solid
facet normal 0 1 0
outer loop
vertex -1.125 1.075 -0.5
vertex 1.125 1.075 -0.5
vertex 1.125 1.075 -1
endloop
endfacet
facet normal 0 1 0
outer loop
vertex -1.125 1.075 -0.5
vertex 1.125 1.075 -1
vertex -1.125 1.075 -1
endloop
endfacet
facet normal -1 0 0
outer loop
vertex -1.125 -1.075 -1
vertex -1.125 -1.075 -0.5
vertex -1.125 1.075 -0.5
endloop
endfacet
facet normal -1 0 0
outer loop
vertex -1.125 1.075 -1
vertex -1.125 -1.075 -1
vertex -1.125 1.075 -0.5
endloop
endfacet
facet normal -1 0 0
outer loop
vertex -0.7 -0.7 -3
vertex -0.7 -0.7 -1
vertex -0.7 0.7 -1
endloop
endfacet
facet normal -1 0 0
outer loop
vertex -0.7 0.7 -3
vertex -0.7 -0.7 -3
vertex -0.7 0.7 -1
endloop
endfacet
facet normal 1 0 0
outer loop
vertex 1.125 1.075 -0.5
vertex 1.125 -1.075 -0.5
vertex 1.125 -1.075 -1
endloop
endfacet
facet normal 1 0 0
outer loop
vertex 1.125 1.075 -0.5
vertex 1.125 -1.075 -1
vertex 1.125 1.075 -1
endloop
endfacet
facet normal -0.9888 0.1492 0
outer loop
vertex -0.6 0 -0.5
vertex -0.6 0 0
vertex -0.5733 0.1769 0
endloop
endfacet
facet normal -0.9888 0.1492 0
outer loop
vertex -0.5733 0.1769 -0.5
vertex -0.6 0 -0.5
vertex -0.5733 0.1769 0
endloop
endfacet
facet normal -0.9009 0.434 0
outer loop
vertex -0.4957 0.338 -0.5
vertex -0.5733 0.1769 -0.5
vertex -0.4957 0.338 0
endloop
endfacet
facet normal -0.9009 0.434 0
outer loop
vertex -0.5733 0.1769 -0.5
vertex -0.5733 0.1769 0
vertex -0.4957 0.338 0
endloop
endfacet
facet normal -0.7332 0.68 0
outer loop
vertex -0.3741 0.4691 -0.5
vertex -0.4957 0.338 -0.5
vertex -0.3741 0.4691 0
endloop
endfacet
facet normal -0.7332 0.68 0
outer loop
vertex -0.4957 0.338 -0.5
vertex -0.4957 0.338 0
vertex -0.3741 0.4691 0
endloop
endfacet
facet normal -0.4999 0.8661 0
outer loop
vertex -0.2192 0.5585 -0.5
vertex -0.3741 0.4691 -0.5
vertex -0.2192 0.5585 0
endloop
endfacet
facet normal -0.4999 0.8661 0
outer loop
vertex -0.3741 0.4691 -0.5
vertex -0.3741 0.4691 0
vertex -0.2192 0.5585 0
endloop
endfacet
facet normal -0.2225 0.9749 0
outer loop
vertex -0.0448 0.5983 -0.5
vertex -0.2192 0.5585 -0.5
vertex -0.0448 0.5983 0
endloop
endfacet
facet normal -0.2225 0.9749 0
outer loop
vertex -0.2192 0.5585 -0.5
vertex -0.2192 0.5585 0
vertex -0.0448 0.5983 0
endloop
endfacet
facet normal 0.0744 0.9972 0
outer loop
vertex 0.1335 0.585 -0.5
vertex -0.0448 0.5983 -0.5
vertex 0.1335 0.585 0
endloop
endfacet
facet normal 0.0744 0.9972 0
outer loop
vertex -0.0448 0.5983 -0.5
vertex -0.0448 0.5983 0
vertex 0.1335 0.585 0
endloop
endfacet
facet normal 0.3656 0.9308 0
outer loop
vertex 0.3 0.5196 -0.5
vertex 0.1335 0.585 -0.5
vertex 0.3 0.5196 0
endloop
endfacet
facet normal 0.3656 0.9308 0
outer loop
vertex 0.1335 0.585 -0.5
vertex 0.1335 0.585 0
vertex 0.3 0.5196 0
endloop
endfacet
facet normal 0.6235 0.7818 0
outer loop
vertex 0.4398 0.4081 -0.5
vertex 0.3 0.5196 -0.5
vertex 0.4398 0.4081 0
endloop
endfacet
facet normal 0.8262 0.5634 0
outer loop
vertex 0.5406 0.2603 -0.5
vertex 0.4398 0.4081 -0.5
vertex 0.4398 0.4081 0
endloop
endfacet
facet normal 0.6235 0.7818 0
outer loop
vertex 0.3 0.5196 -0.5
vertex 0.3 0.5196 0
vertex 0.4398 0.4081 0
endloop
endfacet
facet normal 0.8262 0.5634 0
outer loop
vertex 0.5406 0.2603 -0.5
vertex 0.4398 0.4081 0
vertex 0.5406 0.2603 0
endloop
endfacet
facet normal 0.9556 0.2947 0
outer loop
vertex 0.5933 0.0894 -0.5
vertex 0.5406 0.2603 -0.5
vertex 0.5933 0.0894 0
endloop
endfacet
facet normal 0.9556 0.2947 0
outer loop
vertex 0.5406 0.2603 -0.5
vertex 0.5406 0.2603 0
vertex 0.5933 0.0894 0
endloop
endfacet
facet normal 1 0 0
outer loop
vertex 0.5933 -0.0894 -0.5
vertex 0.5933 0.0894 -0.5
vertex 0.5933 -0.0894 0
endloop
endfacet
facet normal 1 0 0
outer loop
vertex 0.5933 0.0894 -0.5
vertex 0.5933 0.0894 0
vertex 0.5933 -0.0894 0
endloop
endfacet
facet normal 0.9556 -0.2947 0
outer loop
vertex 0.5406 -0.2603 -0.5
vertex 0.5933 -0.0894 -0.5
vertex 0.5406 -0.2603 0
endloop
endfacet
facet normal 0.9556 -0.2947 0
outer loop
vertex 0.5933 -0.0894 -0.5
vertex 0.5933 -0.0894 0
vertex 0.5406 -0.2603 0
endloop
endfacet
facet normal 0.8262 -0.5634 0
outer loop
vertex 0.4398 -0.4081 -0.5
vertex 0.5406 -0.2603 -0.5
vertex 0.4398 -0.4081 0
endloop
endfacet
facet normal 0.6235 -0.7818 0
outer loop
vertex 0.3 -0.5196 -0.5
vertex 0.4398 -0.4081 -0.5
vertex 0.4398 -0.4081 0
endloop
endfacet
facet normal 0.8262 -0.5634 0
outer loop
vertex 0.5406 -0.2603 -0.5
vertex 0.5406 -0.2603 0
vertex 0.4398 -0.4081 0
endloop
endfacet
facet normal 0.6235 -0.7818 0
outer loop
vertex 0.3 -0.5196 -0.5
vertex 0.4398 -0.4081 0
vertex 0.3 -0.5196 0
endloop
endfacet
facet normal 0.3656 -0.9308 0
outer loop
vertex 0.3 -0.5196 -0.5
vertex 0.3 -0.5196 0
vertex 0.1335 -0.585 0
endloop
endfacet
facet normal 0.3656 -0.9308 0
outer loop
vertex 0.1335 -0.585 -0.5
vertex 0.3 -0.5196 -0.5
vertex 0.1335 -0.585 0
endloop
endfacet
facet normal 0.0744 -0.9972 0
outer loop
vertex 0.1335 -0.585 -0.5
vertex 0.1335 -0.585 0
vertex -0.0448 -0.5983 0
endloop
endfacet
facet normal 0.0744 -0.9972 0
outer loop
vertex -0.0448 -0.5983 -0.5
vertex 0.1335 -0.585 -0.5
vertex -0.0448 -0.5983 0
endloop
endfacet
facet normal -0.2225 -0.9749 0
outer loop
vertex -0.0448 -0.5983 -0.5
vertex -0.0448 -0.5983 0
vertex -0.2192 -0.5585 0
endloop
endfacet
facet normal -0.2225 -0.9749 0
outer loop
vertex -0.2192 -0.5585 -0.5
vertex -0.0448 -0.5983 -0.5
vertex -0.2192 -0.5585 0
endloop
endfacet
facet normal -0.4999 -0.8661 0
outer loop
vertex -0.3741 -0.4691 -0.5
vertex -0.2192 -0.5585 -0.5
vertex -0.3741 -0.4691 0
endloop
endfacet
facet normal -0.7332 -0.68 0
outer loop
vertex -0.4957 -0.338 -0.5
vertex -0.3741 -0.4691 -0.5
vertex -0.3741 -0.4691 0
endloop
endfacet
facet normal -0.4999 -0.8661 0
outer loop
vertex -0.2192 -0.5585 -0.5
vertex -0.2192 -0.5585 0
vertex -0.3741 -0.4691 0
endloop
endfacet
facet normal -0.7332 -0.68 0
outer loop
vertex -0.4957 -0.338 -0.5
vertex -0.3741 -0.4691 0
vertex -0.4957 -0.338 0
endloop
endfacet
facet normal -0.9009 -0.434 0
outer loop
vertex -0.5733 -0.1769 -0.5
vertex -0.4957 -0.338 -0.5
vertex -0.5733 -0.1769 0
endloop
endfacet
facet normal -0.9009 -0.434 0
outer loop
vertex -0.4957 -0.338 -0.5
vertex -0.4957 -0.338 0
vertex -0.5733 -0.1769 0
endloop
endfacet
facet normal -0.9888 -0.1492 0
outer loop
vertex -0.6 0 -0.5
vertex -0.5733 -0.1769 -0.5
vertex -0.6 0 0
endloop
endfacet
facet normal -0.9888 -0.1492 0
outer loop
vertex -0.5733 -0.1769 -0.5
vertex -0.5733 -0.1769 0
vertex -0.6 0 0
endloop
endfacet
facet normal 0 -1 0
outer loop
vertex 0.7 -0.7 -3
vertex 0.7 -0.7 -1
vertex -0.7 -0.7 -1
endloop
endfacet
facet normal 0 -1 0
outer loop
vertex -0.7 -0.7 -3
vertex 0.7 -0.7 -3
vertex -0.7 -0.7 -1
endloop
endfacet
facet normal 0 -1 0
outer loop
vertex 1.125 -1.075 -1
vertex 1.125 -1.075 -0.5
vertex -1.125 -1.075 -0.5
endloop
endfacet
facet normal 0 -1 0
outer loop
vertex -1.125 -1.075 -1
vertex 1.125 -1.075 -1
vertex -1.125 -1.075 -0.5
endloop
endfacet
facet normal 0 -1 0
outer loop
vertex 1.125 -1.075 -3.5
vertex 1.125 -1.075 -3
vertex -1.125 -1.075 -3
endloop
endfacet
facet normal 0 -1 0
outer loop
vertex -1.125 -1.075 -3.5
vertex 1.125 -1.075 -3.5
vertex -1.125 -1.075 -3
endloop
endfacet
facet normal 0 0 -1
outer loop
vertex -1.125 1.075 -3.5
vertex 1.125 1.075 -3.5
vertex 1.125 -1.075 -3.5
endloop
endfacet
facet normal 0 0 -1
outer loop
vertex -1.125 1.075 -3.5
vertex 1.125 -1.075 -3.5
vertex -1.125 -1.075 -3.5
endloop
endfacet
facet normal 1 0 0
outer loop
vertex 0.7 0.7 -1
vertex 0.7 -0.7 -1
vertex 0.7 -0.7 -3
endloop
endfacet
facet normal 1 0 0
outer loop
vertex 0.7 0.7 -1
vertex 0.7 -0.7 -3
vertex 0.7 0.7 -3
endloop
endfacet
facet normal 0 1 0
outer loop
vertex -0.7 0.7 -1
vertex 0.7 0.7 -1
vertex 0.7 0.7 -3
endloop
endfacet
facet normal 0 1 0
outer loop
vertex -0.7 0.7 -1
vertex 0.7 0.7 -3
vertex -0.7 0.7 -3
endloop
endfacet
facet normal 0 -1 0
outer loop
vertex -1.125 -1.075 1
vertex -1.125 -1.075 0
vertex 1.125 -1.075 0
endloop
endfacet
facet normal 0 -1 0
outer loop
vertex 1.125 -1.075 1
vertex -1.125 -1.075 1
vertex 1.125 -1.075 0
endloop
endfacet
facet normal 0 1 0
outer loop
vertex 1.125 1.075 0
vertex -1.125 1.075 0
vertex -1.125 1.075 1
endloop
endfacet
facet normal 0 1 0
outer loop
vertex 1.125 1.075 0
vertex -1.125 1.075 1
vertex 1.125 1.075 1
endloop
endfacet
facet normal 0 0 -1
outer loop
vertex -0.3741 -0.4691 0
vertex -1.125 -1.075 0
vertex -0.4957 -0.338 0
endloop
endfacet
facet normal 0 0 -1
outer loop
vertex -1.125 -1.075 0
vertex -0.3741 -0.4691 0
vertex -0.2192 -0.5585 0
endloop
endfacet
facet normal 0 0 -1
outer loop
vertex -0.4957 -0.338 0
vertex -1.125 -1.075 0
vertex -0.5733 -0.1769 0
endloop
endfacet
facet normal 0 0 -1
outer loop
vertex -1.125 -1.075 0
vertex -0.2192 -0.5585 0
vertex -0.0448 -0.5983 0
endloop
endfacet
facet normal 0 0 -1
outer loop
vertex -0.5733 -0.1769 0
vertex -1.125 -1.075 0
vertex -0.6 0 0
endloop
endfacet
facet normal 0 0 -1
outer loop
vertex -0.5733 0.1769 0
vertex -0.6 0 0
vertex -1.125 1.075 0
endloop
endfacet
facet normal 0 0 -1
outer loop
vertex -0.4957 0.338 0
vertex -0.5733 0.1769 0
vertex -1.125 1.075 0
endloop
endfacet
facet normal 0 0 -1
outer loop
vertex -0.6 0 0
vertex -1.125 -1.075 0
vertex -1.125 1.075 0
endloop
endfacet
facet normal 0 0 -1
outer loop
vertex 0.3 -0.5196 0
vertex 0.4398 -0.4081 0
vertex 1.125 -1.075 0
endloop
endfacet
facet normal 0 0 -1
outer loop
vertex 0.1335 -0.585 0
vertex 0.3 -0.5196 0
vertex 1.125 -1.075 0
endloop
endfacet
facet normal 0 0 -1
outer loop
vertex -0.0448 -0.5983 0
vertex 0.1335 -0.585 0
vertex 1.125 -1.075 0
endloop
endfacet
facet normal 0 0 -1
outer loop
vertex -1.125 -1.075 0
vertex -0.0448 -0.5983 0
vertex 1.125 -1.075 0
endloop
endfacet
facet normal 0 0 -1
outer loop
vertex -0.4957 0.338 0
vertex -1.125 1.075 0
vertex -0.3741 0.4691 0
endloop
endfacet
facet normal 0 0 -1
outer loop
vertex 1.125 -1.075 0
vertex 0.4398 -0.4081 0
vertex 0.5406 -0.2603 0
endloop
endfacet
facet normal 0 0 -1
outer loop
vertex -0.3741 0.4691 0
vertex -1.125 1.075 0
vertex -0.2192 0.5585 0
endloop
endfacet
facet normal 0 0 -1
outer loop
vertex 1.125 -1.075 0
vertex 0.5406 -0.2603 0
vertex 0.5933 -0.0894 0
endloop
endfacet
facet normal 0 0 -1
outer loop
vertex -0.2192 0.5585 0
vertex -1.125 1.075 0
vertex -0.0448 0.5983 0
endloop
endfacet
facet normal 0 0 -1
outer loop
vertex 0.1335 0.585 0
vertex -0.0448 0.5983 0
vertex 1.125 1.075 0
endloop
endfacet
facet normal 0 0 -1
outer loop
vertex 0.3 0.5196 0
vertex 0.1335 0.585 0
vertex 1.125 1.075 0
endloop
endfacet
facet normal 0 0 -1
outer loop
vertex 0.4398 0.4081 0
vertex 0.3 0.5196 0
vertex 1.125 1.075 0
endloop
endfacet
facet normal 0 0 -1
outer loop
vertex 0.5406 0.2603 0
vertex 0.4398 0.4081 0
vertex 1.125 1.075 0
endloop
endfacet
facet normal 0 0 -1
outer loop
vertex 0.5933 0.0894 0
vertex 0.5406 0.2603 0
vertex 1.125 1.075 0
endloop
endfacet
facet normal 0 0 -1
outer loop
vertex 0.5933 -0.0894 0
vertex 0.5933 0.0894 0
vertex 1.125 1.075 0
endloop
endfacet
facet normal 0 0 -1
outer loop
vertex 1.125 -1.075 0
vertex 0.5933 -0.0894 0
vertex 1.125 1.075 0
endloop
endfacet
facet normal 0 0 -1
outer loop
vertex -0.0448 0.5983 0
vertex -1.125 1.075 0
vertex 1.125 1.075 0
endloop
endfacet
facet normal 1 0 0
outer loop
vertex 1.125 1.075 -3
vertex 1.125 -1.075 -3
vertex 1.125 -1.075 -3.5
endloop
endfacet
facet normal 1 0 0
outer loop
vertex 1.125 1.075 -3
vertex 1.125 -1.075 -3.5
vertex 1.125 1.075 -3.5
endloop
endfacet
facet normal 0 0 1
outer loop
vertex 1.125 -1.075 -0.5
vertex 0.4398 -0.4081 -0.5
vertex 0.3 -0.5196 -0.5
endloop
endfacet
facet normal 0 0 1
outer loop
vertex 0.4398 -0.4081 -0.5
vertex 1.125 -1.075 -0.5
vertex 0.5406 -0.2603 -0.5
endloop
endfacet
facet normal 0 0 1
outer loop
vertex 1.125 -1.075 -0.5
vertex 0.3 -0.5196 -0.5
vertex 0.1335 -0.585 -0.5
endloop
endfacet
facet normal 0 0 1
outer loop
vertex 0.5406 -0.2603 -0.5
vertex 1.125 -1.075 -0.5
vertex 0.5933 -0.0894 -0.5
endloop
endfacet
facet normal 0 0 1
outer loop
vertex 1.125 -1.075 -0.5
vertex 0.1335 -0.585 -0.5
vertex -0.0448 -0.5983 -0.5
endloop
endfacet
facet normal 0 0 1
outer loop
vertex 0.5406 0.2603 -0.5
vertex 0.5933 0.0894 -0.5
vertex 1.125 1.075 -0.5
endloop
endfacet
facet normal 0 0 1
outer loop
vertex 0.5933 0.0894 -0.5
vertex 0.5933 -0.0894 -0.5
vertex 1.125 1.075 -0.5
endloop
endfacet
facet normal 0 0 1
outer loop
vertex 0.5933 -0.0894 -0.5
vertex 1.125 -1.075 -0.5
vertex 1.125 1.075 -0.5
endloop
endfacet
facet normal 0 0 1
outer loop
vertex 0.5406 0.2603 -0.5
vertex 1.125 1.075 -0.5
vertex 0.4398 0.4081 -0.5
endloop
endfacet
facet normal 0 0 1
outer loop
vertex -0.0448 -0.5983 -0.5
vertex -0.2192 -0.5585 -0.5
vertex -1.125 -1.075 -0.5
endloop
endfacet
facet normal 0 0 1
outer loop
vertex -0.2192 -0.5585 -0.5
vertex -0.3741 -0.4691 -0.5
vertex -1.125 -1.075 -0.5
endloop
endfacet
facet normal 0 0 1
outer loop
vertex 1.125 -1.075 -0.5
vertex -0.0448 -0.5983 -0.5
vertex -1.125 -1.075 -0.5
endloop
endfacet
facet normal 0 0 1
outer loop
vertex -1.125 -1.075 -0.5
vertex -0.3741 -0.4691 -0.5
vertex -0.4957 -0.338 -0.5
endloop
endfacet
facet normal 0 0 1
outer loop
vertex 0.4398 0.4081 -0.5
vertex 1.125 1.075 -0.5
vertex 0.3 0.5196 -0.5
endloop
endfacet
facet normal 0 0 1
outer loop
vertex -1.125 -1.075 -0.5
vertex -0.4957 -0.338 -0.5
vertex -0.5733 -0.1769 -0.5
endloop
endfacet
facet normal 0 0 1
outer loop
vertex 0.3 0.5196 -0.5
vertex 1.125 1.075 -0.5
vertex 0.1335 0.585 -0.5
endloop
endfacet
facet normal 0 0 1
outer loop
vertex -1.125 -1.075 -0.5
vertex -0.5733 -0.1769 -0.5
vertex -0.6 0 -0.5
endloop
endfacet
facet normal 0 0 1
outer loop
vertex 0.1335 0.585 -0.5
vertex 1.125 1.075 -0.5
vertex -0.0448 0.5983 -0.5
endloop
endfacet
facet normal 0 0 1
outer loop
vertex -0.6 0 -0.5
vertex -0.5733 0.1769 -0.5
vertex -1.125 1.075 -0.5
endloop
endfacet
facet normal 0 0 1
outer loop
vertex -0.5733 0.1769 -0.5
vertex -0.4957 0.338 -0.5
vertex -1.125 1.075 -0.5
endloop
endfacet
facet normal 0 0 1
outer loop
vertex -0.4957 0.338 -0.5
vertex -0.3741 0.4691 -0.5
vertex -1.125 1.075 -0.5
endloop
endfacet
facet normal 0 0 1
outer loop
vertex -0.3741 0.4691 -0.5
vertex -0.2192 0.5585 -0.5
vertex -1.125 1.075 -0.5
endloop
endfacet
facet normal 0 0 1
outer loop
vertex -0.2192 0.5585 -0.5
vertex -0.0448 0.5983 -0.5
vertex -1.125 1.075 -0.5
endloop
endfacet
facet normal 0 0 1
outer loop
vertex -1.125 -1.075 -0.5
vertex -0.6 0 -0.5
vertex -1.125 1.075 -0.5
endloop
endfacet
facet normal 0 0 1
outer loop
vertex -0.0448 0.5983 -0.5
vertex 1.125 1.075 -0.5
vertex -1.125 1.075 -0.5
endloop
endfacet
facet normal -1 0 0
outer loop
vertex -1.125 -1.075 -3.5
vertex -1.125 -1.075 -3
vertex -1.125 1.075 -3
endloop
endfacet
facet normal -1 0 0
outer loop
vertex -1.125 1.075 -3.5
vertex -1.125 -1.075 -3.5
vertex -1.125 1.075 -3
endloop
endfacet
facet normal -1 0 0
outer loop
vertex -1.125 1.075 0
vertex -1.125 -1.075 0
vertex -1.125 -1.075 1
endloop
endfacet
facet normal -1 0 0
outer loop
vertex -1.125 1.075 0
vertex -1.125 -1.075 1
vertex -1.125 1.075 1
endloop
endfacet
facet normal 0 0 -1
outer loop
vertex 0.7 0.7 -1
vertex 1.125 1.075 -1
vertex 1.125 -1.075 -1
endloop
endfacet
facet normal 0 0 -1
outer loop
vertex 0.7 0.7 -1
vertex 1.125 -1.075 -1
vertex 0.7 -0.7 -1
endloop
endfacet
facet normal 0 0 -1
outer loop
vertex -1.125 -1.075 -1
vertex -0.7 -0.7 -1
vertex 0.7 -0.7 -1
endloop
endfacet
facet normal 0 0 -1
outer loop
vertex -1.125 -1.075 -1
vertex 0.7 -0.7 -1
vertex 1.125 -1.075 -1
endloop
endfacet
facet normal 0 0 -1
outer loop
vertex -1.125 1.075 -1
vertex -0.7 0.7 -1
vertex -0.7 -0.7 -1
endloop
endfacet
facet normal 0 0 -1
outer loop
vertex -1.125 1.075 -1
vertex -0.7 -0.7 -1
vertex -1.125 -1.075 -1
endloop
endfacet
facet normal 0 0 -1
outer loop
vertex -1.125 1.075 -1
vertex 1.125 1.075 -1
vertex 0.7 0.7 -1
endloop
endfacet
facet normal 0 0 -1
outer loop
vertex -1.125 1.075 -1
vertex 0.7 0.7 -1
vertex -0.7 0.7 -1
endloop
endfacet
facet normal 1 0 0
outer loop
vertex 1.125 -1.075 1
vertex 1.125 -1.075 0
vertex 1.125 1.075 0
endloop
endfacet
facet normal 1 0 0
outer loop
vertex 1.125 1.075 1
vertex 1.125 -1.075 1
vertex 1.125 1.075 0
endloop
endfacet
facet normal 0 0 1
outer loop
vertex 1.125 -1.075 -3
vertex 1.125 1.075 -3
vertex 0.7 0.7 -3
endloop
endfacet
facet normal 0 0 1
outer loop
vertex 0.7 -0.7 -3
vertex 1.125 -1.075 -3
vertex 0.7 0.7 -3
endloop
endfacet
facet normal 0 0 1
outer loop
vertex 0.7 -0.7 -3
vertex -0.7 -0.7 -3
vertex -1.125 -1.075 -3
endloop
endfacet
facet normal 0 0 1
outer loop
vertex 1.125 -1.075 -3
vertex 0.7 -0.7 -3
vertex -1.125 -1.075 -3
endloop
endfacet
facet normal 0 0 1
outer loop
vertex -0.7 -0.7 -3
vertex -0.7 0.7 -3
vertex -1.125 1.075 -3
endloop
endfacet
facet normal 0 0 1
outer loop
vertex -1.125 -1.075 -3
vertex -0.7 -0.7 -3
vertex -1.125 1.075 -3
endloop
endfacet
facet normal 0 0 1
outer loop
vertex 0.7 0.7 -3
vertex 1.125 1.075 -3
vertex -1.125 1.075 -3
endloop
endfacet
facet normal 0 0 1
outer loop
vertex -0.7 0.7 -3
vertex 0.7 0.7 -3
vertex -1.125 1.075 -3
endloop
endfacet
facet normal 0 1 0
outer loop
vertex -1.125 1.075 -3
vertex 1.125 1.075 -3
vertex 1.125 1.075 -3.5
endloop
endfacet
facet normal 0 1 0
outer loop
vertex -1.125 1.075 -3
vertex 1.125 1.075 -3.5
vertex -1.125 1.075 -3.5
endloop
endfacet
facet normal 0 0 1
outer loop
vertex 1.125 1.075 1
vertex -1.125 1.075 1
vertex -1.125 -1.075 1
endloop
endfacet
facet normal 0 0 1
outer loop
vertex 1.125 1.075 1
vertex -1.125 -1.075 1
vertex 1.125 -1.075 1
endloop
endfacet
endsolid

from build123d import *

# Parameters (mm, degrees)
SKETCH_2_W      = 2.25
SKETCH_2_H      = 2.15
EXTRUDE_4_DEPTH = 1
SKETCH_4_R      = 0.6
EXTRUDE_5_DEPTH = 0.5
SKETCH_5_W      = 2.25
SKETCH_5_H      = 2.15
EXTRUDE_6_DEPTH = 0.5
SKETCH_9_W      = 1.4
SKETCH_9_H      = 1.4
EXTRUDE_7_DEPTH = 2
SKETCH_10_W     = 2.25
SKETCH_10_H     = 2.15
EXTRUDE_8_DEPTH = 0.5


with BuildPart() as part:
    # 草图2 → 凸台-拉伸4 (new body)
    with BuildSketch(Plane.XY):
        Rectangle(SKETCH_2_W, SKETCH_2_H)
    extrude(amount=EXTRUDE_4_DEPTH)

    # 草图4 → 凸台-拉伸5 (add)
    with BuildSketch(Plane(origin=(0, 0, 0), x_dir=(-1, 0, 0), z_dir=(0, 0, -1))):
        Circle(SKETCH_4_R)
    extrude(amount=EXTRUDE_5_DEPTH)

    # 草图5 → 凸台-拉伸6 (add)
    with BuildSketch(Plane(origin=(0, 0, -0.5), x_dir=(-1, 0, 0), z_dir=(0, 0, -1))):
        Rectangle(SKETCH_5_W, SKETCH_5_H)
    extrude(amount=EXTRUDE_6_DEPTH)

    # 草图9 → 凸台-拉伸7 (add)
    with BuildSketch(Plane(origin=(0, 0, -1), x_dir=(-1, 0, 0), z_dir=(0, 0, -1))):
        Rectangle(SKETCH_9_W, SKETCH_9_H)
    extrude(amount=EXTRUDE_7_DEPTH)

    # 草图10 → 凸台-拉伸8 (add)
    with BuildSketch(Plane(origin=(0, 0, -3), x_dir=(-1, 0, 0), z_dir=(0, 0, -1))):
        Rectangle(SKETCH_10_W, SKETCH_10_H)
    extrude(amount=EXTRUDE_8_DEPTH)


solid = part.part
